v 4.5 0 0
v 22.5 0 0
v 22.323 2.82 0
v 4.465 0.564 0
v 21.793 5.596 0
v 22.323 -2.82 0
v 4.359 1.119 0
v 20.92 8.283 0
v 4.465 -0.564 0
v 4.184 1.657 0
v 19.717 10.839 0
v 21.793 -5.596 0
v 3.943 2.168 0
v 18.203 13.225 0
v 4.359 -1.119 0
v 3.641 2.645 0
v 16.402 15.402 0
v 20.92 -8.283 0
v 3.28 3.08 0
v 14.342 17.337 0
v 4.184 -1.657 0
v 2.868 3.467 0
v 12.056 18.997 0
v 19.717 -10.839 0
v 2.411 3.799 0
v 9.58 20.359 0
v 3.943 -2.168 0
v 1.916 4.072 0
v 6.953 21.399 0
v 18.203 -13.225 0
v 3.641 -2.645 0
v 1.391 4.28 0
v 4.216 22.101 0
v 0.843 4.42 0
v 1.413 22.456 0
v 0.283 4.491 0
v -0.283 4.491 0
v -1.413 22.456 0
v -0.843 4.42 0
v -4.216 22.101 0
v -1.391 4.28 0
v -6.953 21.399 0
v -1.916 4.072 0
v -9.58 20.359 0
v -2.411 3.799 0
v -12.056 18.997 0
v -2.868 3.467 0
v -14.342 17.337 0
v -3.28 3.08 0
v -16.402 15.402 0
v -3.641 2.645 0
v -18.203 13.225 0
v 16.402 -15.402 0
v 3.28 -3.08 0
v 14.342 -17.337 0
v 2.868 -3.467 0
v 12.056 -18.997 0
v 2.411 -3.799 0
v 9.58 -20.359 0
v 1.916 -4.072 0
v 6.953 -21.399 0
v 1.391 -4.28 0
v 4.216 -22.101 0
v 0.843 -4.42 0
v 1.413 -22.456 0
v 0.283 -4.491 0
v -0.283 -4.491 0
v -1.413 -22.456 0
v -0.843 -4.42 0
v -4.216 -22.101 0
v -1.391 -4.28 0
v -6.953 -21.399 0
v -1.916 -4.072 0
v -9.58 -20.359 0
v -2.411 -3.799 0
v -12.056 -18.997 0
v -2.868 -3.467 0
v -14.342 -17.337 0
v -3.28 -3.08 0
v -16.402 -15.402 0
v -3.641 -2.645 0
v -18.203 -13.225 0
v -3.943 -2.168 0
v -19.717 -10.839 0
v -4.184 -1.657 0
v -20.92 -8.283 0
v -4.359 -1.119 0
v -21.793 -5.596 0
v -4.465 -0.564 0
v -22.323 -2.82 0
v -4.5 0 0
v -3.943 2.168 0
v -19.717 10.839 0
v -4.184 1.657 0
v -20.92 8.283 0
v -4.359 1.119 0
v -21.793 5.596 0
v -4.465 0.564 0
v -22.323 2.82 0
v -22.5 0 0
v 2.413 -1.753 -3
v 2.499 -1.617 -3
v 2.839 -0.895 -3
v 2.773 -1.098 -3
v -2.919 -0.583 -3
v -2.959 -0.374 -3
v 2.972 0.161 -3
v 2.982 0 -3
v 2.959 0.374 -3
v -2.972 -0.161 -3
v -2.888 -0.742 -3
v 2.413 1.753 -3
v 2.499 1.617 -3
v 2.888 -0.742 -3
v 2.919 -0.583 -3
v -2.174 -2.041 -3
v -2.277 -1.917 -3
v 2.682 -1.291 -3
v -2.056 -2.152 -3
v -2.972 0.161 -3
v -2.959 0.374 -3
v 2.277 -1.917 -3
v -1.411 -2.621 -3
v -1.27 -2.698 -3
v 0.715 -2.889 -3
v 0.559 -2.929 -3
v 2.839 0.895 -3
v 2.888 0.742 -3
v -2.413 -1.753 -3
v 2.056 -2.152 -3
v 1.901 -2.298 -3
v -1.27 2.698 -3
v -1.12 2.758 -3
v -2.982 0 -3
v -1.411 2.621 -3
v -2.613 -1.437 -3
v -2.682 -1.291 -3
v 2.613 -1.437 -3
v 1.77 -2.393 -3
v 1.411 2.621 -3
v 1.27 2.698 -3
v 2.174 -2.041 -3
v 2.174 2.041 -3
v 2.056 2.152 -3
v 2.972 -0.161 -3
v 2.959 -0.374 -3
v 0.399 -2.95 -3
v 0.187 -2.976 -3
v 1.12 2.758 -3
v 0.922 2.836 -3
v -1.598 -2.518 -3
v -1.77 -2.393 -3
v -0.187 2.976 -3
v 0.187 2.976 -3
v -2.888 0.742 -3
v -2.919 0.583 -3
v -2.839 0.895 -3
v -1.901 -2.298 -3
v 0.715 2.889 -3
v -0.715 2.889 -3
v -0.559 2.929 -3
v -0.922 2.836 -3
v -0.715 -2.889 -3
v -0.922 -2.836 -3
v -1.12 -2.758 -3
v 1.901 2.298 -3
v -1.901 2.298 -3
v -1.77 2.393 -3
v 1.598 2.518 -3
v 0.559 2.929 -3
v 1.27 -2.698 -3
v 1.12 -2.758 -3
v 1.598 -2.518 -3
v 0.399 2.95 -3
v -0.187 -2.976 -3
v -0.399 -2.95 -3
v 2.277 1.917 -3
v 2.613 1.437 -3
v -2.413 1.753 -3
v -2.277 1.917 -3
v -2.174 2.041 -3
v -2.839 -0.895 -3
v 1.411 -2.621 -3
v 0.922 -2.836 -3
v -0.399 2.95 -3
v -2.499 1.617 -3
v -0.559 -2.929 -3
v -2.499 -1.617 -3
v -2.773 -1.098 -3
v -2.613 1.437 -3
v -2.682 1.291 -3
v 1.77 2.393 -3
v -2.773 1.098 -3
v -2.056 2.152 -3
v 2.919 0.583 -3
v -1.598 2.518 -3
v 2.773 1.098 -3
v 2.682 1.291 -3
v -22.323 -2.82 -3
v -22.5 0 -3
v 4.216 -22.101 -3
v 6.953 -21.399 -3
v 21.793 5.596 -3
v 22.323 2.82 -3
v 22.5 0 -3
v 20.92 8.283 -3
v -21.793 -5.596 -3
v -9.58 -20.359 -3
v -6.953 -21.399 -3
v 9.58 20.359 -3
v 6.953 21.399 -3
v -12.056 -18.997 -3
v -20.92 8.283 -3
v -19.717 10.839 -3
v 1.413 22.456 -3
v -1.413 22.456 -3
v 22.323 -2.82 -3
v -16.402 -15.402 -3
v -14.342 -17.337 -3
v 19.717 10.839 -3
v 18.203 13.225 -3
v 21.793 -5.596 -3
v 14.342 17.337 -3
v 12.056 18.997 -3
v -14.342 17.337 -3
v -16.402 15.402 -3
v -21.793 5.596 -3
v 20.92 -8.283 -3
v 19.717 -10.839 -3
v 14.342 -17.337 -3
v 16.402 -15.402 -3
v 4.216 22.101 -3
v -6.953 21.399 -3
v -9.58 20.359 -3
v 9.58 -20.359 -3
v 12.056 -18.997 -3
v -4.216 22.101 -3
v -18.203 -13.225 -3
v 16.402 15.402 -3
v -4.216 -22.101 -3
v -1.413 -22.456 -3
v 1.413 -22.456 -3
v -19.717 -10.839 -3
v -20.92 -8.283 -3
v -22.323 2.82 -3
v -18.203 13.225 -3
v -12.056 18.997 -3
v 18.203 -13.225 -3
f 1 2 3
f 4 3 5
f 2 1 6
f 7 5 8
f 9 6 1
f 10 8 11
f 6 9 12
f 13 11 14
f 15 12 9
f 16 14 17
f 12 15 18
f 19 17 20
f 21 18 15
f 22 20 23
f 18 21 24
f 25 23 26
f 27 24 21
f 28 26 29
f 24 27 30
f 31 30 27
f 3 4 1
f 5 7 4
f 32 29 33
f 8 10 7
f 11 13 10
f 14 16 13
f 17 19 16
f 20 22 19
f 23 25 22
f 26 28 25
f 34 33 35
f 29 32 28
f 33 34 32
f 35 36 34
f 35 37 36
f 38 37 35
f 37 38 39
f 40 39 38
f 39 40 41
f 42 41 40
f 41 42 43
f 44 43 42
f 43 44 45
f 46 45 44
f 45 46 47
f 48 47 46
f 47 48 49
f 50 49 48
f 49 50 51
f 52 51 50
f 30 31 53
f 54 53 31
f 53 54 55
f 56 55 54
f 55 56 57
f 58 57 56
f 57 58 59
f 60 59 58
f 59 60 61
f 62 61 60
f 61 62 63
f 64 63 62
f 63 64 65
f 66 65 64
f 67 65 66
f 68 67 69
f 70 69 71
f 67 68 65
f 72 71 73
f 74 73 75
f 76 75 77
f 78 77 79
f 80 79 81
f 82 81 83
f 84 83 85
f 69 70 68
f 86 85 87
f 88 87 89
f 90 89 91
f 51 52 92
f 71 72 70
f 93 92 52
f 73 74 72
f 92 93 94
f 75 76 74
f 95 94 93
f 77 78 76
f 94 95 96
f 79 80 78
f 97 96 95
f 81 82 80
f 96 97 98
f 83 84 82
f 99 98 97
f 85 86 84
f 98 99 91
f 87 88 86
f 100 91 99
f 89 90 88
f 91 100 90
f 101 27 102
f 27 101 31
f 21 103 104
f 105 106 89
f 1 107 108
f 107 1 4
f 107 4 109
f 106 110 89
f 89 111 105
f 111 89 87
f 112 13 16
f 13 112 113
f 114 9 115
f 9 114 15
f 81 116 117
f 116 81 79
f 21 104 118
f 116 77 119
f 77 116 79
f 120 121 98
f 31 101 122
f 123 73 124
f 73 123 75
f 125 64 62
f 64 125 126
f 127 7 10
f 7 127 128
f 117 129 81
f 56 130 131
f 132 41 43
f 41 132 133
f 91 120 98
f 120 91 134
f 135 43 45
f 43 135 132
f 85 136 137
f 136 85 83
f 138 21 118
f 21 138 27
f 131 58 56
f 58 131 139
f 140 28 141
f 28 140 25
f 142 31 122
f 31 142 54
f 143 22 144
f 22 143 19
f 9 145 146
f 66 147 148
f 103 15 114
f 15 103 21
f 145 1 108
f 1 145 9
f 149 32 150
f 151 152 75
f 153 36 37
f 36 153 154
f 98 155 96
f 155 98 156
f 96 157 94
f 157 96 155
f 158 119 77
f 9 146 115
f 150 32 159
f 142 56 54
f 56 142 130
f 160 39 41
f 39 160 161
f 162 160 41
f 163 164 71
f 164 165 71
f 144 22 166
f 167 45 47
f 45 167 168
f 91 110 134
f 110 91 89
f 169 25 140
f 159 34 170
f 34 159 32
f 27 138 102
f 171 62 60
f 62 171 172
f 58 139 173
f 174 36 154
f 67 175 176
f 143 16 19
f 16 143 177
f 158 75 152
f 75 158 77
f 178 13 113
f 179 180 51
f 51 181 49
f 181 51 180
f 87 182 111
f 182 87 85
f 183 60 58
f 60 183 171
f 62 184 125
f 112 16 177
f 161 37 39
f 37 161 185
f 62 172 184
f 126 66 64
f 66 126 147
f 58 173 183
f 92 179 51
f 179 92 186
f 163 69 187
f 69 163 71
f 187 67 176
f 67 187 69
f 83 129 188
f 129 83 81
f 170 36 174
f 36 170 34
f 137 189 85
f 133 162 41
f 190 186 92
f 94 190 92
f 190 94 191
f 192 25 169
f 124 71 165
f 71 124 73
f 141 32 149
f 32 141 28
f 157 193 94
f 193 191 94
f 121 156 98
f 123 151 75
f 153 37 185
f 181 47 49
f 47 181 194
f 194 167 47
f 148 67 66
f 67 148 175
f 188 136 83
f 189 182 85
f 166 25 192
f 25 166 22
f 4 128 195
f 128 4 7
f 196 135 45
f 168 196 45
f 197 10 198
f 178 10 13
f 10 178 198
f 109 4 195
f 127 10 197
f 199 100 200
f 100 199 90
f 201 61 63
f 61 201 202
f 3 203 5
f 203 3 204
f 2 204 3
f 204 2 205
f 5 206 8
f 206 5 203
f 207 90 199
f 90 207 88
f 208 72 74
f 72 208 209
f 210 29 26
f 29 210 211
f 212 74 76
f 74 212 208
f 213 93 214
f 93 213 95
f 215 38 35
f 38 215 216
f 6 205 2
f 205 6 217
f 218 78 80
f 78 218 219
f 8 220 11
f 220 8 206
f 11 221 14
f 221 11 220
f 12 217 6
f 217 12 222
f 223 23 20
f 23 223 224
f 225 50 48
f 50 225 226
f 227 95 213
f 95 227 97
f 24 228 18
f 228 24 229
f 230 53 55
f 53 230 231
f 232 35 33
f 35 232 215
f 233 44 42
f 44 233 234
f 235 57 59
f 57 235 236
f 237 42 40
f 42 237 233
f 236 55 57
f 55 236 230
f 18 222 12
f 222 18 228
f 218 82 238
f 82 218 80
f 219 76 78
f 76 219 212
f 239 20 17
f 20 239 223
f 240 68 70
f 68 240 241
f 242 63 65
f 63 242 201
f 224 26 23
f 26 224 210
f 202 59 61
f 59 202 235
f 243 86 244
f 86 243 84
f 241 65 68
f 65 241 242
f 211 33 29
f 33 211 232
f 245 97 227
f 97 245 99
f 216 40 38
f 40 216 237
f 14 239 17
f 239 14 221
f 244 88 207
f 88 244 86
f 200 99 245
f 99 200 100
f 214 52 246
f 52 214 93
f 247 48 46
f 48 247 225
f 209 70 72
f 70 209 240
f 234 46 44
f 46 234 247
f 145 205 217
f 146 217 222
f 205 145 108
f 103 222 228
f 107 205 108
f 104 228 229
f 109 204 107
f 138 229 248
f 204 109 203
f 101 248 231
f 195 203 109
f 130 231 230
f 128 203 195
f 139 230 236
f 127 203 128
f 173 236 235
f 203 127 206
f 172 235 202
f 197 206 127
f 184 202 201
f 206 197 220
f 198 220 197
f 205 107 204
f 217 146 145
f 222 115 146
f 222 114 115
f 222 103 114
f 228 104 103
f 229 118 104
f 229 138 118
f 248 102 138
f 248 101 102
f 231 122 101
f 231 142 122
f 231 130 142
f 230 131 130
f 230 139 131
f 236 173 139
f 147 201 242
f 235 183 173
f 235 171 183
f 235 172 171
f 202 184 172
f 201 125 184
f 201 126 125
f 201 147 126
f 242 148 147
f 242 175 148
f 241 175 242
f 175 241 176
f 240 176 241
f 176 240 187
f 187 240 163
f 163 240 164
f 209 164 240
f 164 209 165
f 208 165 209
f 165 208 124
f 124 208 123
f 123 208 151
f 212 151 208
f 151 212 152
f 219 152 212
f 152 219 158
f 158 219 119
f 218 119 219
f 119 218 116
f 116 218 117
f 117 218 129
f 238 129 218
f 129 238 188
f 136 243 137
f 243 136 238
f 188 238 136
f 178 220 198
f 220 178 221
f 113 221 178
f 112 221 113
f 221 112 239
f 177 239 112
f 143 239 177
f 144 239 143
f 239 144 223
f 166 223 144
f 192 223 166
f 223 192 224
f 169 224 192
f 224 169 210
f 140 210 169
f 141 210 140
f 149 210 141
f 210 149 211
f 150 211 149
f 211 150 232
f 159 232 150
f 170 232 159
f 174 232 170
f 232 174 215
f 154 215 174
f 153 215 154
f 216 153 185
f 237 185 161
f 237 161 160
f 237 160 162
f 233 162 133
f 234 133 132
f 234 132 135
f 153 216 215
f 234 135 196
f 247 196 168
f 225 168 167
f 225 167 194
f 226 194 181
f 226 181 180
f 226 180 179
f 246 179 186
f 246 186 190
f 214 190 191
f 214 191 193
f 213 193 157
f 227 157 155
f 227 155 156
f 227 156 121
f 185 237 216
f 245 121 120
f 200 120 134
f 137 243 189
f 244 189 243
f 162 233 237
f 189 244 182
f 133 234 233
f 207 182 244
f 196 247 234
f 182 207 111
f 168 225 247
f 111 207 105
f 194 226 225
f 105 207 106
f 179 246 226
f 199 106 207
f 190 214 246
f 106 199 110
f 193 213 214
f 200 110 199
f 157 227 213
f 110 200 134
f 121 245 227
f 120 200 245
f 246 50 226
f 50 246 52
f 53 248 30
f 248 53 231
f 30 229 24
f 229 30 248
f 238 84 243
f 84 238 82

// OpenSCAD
$fn = 50;

difference() {
	union() {
		translate(v = [0, 0, -3.0]) {
			cylinder(h = 3, r = 22.5);
		}
	}
	union() {
		translate(v = [0, 0, 0]) {
			rotate(a = [0, 0, 0]) {
				difference() {
					union() {
						translate(v = [0, 0, -6.0]) {
							cylinder(h = 6, r = 2.25);
						}
						translate(v = [0, 0, -4.2]) {
							cylinder(h = 4.2, r1 = 2.375, r2 = 4.5);
						}
						translate(v = [0, 0, -6.0]) {
							cylinder(h = 6, r = 2.375);
						}
						translate(v = [0, 0, -6.0]) {
							cylinder(h = 6, r = 2.25);
						}
					}
					union();
				}
			}
		}
	}
}
